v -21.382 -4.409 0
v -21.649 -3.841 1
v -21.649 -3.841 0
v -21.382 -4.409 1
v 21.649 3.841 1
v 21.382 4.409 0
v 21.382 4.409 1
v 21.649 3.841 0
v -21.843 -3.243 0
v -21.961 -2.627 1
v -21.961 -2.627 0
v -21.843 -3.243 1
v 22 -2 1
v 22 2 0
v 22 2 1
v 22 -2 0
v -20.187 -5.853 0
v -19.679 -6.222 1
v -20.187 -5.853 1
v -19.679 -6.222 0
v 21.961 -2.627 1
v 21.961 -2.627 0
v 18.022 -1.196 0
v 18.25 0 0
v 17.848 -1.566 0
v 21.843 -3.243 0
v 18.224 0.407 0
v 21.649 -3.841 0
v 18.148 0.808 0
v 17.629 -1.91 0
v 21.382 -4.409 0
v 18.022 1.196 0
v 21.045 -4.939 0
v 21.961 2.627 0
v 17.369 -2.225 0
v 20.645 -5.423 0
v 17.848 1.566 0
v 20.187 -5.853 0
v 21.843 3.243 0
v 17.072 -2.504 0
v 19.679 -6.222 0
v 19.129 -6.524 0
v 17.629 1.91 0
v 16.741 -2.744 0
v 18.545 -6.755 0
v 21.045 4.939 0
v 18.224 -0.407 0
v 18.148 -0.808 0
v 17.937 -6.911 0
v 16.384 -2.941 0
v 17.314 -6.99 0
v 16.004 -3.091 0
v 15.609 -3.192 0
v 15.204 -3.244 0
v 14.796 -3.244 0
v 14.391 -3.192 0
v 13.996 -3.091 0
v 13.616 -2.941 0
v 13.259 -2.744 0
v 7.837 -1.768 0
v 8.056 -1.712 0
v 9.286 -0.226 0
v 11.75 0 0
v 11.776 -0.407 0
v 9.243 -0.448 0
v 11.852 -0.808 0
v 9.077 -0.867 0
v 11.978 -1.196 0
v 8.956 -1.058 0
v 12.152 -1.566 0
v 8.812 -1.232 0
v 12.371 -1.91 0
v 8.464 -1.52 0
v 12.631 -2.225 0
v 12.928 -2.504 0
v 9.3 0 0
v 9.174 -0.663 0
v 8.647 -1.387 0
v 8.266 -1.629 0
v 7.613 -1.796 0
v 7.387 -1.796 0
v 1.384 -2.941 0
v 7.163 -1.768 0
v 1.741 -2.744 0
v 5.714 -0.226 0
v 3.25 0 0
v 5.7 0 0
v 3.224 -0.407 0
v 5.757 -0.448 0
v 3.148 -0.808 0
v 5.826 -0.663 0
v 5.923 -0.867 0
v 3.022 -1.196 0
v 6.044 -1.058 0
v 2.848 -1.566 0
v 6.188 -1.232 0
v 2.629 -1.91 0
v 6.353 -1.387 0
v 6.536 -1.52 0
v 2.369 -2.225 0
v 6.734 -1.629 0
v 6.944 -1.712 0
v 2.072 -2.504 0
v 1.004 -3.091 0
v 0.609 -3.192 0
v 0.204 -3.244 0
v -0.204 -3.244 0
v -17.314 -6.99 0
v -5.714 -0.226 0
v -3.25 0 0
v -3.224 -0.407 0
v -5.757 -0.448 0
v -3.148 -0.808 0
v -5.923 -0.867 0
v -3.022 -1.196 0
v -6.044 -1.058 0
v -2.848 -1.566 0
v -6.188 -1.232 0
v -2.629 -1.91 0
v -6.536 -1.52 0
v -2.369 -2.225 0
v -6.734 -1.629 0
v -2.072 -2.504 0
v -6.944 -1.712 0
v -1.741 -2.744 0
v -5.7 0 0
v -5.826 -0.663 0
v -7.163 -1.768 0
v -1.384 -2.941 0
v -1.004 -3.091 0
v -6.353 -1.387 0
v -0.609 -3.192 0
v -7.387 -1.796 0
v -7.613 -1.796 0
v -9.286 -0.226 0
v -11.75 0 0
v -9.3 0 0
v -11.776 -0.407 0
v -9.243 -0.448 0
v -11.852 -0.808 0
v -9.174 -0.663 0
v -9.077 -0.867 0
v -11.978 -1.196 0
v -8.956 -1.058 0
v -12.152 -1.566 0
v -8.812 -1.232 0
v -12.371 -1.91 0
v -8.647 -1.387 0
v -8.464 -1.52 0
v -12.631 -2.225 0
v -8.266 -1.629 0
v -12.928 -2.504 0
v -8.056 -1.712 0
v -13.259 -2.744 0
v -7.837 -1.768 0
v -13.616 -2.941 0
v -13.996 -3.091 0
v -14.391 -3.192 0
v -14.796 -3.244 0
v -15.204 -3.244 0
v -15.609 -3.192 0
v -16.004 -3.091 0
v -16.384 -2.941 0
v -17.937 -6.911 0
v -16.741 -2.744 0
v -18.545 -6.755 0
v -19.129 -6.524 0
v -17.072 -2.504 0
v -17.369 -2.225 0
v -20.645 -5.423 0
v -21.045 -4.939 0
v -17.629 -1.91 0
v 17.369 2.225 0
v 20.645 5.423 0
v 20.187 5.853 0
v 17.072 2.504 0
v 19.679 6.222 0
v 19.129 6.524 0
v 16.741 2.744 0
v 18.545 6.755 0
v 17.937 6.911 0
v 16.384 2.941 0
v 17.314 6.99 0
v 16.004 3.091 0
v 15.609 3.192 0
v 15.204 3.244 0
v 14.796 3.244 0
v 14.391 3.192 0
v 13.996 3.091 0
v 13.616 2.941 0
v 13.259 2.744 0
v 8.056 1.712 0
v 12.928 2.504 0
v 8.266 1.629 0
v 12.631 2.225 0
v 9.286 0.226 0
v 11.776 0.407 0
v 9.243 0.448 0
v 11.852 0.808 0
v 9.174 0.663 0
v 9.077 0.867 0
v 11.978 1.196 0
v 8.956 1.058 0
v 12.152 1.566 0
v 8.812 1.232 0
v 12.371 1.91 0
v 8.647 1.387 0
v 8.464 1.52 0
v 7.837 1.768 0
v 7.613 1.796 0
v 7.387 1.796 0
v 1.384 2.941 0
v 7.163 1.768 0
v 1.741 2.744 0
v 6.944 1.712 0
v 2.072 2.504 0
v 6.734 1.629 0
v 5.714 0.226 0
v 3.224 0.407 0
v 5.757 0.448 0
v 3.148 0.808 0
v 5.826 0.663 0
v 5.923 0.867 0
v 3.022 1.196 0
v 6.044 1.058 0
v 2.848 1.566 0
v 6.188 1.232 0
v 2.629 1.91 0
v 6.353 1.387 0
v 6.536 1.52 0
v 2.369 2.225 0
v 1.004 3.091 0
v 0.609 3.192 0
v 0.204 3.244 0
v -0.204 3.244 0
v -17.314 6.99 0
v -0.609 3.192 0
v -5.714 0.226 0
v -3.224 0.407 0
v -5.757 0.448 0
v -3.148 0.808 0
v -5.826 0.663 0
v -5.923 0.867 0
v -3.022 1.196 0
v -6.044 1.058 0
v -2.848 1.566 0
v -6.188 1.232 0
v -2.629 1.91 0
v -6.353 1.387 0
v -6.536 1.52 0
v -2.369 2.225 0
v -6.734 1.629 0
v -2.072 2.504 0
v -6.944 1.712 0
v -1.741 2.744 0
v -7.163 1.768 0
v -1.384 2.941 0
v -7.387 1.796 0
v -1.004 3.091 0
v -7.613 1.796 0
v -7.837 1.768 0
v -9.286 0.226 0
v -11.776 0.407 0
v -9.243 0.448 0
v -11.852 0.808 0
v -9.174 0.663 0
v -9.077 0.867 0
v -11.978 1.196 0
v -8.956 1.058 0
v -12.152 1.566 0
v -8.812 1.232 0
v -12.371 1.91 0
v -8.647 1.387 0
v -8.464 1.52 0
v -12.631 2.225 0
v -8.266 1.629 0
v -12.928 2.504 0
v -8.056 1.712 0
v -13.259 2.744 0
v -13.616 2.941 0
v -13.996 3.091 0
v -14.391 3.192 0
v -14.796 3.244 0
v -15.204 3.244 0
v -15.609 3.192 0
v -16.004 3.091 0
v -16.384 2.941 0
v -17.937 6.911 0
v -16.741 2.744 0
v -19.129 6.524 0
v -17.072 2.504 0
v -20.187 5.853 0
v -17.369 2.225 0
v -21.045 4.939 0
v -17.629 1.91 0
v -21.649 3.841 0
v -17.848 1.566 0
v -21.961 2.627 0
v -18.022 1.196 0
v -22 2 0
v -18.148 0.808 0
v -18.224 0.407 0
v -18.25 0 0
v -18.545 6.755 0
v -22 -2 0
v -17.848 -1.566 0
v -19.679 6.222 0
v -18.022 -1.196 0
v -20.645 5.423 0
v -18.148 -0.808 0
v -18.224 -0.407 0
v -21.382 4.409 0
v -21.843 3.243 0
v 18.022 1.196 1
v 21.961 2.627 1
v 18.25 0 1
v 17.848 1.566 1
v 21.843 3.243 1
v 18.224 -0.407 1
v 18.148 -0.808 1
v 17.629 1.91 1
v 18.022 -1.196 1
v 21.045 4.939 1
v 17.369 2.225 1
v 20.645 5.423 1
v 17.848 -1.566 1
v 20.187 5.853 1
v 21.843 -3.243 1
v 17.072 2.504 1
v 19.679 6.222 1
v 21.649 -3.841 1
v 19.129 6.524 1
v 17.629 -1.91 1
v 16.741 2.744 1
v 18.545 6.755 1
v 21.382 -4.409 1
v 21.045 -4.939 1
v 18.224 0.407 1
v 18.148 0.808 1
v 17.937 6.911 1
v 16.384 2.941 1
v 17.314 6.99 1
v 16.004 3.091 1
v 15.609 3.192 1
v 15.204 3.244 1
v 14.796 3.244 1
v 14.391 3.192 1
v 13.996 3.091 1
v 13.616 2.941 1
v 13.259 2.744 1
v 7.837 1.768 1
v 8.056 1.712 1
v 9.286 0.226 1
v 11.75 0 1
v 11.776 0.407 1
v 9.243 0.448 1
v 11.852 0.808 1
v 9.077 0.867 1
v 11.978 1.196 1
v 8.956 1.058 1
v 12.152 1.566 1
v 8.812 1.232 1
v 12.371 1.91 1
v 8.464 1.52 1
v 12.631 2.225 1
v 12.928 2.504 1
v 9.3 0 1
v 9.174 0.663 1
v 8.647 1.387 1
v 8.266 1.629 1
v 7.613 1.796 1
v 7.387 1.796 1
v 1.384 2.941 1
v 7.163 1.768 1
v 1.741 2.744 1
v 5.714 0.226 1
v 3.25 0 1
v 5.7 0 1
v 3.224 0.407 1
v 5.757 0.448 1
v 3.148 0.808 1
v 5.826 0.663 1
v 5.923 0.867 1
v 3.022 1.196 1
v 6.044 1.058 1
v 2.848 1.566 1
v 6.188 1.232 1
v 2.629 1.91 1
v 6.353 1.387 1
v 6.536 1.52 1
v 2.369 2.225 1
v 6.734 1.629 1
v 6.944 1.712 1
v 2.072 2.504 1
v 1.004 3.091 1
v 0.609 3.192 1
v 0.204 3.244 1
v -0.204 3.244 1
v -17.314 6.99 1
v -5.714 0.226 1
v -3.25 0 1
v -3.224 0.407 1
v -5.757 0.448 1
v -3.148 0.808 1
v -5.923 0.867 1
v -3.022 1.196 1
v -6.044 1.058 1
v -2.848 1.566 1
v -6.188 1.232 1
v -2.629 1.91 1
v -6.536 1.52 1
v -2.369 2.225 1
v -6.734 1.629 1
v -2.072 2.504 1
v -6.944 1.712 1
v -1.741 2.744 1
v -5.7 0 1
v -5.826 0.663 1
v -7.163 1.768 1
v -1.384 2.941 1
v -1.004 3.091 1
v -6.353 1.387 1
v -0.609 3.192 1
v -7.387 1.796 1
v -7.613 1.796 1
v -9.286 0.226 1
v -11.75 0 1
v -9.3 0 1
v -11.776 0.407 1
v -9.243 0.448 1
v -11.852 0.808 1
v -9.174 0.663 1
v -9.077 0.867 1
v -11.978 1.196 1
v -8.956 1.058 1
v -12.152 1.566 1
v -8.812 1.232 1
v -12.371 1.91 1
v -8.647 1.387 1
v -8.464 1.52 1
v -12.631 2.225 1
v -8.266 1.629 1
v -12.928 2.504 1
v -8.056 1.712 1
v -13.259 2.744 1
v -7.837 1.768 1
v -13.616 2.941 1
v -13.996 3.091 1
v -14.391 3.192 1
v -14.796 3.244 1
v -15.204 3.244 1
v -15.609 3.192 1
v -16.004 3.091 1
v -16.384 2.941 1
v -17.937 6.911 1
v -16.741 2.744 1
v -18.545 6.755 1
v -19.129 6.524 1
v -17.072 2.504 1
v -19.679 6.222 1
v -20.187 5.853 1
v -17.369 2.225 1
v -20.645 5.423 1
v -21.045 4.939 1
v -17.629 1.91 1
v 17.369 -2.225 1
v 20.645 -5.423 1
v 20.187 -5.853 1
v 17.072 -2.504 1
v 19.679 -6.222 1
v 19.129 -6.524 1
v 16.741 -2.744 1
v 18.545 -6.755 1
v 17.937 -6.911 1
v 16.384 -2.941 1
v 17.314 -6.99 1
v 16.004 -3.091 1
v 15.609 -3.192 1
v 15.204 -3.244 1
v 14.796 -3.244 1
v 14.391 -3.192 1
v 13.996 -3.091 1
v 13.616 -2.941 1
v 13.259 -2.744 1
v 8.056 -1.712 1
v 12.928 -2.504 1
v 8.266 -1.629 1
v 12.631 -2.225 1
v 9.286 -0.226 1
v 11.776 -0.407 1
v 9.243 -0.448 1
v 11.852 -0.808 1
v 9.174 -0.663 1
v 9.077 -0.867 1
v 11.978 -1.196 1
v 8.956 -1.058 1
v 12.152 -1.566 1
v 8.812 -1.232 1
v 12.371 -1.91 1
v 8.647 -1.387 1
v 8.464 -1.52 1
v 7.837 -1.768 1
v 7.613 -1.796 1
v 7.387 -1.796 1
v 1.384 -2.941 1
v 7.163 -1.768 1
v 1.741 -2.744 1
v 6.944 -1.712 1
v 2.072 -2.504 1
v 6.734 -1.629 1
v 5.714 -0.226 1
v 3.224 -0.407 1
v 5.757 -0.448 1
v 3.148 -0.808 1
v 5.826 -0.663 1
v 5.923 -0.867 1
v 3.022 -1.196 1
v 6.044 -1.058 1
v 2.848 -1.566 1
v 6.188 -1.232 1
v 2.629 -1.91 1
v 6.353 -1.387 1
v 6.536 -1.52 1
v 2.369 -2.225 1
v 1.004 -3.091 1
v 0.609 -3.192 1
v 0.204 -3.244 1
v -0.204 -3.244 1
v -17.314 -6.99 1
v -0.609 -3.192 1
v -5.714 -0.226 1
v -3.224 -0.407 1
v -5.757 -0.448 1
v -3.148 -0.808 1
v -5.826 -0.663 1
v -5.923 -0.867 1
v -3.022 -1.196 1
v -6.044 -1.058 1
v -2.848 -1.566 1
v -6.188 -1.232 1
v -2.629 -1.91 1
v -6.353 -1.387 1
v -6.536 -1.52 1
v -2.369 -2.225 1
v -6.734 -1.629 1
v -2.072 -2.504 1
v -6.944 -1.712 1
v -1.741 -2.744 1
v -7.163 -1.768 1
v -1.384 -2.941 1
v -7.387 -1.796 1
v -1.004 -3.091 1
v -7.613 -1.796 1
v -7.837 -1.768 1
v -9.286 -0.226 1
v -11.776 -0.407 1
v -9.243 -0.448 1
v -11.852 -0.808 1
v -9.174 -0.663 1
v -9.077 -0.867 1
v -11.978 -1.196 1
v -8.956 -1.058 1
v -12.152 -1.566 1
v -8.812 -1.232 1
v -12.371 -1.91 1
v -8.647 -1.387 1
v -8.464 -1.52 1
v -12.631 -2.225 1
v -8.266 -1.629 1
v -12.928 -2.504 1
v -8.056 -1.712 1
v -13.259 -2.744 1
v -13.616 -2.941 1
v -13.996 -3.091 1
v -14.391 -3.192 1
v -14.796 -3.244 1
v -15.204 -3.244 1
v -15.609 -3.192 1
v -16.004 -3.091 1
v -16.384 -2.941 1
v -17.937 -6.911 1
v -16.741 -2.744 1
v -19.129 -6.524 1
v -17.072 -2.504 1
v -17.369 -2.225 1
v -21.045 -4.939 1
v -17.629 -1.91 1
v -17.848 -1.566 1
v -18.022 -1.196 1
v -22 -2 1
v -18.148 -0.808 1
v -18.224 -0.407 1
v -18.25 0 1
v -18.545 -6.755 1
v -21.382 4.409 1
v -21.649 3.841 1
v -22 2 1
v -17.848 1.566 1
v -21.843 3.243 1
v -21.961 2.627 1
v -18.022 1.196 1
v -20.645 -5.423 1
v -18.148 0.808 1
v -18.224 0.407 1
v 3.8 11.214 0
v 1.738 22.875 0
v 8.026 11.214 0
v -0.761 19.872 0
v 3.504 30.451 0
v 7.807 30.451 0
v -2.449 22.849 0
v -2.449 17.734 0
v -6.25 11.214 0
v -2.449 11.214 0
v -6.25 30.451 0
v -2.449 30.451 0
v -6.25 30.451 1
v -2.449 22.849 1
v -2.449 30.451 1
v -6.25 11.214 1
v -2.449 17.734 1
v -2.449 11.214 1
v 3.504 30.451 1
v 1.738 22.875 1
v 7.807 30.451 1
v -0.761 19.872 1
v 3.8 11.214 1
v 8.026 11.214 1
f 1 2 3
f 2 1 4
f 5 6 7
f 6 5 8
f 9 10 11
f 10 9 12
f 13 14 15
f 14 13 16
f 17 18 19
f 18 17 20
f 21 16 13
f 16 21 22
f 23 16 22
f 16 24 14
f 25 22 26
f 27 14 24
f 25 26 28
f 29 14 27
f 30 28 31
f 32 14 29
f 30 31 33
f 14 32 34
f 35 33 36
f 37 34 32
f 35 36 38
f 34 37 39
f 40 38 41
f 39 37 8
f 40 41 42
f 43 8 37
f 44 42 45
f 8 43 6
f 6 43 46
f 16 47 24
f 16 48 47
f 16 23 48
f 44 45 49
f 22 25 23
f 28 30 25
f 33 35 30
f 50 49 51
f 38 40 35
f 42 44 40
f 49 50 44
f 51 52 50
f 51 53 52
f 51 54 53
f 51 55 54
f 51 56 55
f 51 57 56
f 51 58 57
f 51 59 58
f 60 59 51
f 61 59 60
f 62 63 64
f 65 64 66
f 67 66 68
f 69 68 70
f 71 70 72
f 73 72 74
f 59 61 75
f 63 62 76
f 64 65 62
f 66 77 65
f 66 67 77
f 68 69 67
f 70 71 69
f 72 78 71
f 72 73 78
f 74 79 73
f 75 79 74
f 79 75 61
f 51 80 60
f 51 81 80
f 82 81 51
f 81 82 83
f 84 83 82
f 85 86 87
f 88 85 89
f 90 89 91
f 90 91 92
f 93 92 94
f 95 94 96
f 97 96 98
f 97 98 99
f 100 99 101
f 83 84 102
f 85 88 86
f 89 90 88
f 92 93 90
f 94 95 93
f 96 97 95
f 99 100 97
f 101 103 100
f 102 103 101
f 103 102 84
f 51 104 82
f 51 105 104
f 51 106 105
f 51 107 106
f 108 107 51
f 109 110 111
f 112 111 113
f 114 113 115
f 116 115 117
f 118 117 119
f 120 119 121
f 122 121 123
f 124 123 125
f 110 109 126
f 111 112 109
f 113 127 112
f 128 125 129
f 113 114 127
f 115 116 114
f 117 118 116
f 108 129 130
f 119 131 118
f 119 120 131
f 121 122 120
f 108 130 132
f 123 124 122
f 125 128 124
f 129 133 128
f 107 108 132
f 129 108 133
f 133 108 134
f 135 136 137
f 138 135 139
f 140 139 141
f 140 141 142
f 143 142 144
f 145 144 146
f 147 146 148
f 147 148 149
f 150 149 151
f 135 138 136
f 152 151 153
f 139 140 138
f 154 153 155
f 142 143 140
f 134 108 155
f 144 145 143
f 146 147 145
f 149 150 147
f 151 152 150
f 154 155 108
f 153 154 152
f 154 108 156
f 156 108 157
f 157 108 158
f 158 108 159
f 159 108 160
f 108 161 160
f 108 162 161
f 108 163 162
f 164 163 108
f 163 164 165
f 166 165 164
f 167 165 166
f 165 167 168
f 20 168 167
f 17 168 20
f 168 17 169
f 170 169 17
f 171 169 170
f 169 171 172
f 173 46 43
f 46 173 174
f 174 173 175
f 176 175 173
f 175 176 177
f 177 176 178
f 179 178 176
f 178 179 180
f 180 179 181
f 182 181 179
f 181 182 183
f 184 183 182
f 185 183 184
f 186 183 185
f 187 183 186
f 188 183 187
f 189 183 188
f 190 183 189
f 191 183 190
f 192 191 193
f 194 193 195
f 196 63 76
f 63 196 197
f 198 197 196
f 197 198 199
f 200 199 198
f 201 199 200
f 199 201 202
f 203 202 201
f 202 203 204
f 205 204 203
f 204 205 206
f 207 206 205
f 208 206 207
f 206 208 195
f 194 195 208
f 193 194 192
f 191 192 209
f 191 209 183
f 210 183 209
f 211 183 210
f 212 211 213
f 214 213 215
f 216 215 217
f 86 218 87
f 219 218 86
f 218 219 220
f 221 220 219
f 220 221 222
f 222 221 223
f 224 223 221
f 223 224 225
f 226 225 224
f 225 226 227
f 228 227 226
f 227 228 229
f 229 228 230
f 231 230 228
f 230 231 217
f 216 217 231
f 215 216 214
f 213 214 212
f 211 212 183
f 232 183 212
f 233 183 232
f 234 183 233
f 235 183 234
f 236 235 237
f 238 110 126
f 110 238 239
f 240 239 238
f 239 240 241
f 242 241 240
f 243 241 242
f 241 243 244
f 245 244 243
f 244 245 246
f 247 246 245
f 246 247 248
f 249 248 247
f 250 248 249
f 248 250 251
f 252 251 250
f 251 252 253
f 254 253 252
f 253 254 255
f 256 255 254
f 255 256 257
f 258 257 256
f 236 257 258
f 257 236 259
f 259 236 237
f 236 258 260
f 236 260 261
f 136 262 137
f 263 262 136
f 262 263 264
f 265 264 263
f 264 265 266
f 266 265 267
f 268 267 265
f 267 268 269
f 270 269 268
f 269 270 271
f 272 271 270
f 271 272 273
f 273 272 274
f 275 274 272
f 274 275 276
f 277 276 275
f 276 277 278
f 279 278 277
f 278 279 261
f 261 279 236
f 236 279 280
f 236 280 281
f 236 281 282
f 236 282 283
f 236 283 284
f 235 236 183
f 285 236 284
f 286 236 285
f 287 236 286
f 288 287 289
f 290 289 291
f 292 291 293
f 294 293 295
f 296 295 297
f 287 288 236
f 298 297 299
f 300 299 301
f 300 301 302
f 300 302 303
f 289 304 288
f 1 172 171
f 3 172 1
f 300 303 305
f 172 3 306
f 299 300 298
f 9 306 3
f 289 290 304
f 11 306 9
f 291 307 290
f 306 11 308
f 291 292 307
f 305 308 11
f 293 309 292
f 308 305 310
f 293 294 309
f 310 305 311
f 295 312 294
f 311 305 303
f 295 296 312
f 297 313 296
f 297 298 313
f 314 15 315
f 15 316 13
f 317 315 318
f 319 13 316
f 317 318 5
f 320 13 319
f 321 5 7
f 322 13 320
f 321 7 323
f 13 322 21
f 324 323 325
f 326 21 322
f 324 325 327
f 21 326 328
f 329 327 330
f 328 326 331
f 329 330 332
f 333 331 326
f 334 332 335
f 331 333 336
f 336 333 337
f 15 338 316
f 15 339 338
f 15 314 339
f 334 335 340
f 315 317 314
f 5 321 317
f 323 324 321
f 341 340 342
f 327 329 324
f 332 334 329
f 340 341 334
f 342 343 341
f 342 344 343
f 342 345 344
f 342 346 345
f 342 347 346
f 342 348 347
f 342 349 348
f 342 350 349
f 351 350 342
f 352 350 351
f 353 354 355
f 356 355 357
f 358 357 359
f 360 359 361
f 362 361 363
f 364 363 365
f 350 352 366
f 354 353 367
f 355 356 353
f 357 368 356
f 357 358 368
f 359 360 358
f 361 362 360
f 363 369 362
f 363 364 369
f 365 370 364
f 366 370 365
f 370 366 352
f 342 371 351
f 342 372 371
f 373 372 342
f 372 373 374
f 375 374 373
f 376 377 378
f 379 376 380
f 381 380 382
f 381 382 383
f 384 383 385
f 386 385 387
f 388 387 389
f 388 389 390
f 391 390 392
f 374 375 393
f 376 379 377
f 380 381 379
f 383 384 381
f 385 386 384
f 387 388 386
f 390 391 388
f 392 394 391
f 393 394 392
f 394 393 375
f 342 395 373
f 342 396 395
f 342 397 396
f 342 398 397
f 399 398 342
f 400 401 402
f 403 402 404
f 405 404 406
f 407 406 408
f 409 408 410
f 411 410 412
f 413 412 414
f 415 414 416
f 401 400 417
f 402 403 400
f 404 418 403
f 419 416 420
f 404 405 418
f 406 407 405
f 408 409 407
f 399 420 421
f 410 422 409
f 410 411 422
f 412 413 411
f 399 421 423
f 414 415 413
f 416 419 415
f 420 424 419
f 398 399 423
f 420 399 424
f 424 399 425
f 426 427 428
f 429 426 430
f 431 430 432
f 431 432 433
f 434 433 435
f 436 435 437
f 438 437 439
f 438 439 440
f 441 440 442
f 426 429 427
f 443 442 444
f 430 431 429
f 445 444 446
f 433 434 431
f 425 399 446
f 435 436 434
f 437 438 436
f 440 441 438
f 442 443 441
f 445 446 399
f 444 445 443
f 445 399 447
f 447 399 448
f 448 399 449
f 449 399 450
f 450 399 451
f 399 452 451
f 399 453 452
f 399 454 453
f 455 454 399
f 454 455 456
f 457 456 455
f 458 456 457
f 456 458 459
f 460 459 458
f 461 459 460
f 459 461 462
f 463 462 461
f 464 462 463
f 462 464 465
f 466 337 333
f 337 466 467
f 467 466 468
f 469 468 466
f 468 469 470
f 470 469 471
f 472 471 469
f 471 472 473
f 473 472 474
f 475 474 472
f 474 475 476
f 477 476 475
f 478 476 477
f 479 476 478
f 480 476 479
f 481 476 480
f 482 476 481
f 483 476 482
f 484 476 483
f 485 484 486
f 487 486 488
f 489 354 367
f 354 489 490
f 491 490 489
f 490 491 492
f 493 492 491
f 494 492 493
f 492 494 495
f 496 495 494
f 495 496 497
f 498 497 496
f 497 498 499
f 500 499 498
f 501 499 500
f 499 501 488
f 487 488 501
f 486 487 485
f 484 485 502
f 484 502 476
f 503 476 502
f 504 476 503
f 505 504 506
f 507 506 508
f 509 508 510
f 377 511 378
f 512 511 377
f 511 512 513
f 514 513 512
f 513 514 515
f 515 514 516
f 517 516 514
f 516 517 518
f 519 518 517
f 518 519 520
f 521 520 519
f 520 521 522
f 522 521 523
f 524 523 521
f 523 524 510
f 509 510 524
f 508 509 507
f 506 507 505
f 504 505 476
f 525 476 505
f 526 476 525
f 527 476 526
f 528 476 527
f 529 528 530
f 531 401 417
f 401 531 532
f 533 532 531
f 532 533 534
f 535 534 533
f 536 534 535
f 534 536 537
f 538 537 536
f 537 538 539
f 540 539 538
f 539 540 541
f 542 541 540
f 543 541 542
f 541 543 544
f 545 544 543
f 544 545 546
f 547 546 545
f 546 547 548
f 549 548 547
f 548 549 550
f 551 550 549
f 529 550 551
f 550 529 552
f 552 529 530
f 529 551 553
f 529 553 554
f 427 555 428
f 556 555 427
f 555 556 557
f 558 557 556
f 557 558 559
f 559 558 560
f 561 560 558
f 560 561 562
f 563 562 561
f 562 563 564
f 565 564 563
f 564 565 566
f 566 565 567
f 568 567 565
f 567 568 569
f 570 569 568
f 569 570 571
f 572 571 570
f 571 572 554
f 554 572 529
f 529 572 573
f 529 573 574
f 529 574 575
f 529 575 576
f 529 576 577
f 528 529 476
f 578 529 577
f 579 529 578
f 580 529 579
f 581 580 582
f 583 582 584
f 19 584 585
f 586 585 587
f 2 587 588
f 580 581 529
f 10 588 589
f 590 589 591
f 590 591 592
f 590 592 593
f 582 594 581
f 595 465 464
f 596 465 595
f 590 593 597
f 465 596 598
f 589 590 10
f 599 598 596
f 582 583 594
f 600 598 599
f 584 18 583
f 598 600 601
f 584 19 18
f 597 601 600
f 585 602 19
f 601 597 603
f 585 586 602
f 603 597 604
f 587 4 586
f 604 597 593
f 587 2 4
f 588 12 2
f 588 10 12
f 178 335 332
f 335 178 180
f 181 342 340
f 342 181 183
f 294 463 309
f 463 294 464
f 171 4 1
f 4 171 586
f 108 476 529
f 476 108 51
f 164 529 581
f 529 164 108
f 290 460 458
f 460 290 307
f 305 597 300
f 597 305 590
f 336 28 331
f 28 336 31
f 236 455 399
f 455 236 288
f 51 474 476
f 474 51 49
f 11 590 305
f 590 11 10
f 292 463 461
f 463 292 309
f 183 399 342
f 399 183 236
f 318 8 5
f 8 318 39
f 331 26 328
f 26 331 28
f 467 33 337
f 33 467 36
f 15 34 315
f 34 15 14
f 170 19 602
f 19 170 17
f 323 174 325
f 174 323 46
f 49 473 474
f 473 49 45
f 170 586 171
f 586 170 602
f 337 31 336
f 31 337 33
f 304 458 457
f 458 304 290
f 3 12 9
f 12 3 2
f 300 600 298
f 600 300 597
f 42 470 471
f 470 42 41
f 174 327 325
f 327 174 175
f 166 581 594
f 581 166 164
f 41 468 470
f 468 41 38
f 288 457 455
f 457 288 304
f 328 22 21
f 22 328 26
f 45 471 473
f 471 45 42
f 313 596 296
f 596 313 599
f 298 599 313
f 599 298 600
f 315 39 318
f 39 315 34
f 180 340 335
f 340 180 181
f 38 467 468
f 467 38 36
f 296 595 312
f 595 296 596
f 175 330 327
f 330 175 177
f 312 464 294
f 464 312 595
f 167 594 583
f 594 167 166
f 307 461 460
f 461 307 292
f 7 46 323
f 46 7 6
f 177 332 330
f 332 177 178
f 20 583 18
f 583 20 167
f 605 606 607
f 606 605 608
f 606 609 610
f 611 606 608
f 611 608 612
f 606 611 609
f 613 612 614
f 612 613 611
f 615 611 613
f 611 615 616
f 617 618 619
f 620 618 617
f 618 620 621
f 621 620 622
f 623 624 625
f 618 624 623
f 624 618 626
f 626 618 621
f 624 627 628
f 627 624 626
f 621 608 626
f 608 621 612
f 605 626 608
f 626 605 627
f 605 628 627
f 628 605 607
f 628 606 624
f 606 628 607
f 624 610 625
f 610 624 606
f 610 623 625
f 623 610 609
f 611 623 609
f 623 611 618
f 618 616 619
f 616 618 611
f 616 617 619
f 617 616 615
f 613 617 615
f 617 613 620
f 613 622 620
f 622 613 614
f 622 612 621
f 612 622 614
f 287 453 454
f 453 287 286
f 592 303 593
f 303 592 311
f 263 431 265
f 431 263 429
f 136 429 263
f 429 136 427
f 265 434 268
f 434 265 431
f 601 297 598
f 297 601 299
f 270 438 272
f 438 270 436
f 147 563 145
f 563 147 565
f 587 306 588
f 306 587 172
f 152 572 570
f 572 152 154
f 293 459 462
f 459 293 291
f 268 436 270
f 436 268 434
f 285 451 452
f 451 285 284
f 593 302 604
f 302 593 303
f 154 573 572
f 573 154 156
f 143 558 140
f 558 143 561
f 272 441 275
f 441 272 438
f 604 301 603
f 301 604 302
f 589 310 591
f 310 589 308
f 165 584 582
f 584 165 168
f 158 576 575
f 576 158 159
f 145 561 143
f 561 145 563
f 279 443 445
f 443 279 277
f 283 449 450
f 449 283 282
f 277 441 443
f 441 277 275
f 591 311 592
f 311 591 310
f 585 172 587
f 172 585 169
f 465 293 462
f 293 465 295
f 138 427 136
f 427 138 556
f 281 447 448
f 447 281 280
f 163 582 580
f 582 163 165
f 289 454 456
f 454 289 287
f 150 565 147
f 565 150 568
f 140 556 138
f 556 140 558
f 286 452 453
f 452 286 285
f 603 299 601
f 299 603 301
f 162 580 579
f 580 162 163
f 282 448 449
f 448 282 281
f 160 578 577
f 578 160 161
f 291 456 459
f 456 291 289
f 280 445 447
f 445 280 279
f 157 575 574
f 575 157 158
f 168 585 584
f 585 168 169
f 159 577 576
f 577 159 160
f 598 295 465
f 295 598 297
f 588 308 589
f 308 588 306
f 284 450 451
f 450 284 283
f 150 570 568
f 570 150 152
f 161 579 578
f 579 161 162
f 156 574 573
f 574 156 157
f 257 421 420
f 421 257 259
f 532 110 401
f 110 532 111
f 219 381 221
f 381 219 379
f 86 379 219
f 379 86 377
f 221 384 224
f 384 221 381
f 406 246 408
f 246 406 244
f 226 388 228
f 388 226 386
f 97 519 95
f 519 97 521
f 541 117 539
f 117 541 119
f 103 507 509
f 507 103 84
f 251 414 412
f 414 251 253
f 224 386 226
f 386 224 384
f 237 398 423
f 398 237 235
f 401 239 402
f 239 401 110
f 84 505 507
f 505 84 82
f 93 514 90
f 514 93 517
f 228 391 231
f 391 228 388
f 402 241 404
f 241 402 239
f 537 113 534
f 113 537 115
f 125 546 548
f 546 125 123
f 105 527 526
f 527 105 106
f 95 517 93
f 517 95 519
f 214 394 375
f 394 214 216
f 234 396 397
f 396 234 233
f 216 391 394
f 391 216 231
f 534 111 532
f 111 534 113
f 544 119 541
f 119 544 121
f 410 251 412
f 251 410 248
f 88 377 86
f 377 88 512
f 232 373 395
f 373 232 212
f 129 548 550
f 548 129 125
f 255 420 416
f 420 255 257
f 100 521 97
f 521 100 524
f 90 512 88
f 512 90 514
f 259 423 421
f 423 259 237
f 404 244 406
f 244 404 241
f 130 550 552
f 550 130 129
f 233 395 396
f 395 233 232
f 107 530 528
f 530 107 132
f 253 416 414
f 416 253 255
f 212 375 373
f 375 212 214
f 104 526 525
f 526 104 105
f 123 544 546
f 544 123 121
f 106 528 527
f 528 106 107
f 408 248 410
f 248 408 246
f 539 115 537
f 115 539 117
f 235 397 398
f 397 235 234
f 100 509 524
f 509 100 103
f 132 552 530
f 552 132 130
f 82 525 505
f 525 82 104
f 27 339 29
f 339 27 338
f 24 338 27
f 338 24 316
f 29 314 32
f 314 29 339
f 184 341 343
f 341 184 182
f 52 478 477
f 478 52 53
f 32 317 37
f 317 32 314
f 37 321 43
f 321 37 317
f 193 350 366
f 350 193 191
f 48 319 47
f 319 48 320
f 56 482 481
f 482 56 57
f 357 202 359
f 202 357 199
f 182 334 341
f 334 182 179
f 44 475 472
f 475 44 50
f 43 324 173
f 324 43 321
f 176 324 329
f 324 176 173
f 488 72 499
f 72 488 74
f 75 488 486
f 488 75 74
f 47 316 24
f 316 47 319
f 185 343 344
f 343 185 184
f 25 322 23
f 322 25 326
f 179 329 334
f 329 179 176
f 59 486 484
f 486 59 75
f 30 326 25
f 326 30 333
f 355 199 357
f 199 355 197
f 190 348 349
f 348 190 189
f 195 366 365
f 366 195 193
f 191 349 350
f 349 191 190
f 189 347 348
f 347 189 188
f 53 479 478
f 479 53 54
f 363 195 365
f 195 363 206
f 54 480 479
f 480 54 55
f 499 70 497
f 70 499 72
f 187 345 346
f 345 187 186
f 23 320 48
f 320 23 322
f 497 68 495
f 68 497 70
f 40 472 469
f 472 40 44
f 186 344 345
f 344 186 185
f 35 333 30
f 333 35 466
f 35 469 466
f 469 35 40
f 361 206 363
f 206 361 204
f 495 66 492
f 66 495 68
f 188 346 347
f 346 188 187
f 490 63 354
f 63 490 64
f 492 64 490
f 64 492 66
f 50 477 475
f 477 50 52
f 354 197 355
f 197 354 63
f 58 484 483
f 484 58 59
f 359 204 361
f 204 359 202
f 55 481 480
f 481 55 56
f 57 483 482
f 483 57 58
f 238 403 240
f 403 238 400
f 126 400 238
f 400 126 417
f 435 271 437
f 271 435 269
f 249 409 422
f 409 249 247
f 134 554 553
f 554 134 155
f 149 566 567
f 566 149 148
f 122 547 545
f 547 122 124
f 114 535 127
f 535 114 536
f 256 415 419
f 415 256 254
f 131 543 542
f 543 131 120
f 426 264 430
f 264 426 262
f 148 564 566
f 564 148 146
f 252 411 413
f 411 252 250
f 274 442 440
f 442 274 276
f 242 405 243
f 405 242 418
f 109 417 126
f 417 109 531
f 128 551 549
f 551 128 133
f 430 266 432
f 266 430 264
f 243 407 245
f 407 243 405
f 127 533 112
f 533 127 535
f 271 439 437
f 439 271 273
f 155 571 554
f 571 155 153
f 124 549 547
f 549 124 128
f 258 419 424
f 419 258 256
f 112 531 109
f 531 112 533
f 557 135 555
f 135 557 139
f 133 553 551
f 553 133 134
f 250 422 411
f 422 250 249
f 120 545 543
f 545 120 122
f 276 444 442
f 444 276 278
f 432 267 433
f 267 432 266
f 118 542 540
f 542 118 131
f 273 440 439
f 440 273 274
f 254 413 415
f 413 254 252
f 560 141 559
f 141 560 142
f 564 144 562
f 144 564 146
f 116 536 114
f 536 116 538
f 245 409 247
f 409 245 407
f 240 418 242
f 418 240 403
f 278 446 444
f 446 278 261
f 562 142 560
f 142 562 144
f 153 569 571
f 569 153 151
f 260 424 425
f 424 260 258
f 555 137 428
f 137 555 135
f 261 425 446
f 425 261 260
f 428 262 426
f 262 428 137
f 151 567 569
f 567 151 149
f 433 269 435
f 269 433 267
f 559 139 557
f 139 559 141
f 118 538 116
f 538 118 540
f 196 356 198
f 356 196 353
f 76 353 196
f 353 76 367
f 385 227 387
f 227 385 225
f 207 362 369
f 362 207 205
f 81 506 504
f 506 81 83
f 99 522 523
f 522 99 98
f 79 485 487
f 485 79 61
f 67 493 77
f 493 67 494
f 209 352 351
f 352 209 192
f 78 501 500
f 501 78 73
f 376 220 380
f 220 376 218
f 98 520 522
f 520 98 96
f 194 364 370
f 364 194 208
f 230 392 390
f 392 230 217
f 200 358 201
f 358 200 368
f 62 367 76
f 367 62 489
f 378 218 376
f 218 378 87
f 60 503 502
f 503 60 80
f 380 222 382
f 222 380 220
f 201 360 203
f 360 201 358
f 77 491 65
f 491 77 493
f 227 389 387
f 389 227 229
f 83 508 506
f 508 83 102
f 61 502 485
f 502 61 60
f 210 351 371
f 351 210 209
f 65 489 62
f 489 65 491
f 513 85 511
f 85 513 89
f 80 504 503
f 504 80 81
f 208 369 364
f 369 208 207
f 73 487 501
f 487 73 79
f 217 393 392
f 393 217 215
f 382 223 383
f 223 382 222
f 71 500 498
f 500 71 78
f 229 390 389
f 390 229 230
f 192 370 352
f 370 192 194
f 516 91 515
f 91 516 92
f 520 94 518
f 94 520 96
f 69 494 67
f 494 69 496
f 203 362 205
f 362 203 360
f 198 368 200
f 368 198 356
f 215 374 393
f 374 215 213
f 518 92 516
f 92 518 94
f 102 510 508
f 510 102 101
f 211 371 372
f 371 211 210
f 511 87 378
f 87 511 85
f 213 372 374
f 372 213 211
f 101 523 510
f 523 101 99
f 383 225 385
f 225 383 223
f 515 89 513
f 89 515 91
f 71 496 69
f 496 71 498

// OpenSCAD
$fn = 50;


difference() {
	union() {
		hull() {
			translate(v = [-17.0000000000, 2.0000000000, 0]) {
				cylinder(h = 1, r = 5);
			}
			translate(v = [17.0000000000, 2.0000000000, 0]) {
				cylinder(h = 1, r = 5);
			}
			translate(v = [-17.0000000000, -2.0000000000, 0]) {
				cylinder(h = 1, r = 5);
			}
			translate(v = [17.0000000000, -2.0000000000, 0]) {
				cylinder(h = 1, r = 5);
			}
		}
		translate(v = [0, 30.0000000000, 0]) {
			linear_extrude(height = 1) {
				text(font = "DejaVu Sans Mono:style=Bold", halign = "center", size = 19.0000000000, text = "K", valign = "top");
			}
		}
	}
	union() {
		translate(v = [-15.0000000000, 0.0000000000, 0]) {
			translate(v = [0, 0, -100]) {
				cylinder(h = 200, r = 3.2500000000);
			}
		}
		translate(v = [0, 0, -100]) {
			cylinder(h = 200, r = 3.2500000000);
		}
		translate(v = [15.0000000000, 0.0000000000, 0]) {
			translate(v = [0, 0, -100]) {
				cylinder(h = 200, r = 3.2500000000);
			}
		}
		translate(v = [-15.0000000000, 0.0000000000, 0]) {
			translate(v = [0, 0, -100]) {
				cylinder(h = 200, r = 1.8000000000);
			}
		}
		translate(v = [-7.5000000000, 0.0000000000, 0]) {
			translate(v = [0, 0, -100]) {
				cylinder(h = 200, r = 1.8000000000);
			}
		}
		translate(v = [0, 0, -100]) {
			cylinder(h = 200, r = 1.8000000000);
		}
		translate(v = [7.5000000000, 0.0000000000, 0]) {
			translate(v = [0, 0, -100]) {
				cylinder(h = 200, r = 1.8000000000);
			}
		}
		translate(v = [15.0000000000, 0.0000000000, 0]) {
			translate(v = [0, 0, -100]) {
				cylinder(h = 200, r = 1.8000000000);
			}
		}
	}
}
